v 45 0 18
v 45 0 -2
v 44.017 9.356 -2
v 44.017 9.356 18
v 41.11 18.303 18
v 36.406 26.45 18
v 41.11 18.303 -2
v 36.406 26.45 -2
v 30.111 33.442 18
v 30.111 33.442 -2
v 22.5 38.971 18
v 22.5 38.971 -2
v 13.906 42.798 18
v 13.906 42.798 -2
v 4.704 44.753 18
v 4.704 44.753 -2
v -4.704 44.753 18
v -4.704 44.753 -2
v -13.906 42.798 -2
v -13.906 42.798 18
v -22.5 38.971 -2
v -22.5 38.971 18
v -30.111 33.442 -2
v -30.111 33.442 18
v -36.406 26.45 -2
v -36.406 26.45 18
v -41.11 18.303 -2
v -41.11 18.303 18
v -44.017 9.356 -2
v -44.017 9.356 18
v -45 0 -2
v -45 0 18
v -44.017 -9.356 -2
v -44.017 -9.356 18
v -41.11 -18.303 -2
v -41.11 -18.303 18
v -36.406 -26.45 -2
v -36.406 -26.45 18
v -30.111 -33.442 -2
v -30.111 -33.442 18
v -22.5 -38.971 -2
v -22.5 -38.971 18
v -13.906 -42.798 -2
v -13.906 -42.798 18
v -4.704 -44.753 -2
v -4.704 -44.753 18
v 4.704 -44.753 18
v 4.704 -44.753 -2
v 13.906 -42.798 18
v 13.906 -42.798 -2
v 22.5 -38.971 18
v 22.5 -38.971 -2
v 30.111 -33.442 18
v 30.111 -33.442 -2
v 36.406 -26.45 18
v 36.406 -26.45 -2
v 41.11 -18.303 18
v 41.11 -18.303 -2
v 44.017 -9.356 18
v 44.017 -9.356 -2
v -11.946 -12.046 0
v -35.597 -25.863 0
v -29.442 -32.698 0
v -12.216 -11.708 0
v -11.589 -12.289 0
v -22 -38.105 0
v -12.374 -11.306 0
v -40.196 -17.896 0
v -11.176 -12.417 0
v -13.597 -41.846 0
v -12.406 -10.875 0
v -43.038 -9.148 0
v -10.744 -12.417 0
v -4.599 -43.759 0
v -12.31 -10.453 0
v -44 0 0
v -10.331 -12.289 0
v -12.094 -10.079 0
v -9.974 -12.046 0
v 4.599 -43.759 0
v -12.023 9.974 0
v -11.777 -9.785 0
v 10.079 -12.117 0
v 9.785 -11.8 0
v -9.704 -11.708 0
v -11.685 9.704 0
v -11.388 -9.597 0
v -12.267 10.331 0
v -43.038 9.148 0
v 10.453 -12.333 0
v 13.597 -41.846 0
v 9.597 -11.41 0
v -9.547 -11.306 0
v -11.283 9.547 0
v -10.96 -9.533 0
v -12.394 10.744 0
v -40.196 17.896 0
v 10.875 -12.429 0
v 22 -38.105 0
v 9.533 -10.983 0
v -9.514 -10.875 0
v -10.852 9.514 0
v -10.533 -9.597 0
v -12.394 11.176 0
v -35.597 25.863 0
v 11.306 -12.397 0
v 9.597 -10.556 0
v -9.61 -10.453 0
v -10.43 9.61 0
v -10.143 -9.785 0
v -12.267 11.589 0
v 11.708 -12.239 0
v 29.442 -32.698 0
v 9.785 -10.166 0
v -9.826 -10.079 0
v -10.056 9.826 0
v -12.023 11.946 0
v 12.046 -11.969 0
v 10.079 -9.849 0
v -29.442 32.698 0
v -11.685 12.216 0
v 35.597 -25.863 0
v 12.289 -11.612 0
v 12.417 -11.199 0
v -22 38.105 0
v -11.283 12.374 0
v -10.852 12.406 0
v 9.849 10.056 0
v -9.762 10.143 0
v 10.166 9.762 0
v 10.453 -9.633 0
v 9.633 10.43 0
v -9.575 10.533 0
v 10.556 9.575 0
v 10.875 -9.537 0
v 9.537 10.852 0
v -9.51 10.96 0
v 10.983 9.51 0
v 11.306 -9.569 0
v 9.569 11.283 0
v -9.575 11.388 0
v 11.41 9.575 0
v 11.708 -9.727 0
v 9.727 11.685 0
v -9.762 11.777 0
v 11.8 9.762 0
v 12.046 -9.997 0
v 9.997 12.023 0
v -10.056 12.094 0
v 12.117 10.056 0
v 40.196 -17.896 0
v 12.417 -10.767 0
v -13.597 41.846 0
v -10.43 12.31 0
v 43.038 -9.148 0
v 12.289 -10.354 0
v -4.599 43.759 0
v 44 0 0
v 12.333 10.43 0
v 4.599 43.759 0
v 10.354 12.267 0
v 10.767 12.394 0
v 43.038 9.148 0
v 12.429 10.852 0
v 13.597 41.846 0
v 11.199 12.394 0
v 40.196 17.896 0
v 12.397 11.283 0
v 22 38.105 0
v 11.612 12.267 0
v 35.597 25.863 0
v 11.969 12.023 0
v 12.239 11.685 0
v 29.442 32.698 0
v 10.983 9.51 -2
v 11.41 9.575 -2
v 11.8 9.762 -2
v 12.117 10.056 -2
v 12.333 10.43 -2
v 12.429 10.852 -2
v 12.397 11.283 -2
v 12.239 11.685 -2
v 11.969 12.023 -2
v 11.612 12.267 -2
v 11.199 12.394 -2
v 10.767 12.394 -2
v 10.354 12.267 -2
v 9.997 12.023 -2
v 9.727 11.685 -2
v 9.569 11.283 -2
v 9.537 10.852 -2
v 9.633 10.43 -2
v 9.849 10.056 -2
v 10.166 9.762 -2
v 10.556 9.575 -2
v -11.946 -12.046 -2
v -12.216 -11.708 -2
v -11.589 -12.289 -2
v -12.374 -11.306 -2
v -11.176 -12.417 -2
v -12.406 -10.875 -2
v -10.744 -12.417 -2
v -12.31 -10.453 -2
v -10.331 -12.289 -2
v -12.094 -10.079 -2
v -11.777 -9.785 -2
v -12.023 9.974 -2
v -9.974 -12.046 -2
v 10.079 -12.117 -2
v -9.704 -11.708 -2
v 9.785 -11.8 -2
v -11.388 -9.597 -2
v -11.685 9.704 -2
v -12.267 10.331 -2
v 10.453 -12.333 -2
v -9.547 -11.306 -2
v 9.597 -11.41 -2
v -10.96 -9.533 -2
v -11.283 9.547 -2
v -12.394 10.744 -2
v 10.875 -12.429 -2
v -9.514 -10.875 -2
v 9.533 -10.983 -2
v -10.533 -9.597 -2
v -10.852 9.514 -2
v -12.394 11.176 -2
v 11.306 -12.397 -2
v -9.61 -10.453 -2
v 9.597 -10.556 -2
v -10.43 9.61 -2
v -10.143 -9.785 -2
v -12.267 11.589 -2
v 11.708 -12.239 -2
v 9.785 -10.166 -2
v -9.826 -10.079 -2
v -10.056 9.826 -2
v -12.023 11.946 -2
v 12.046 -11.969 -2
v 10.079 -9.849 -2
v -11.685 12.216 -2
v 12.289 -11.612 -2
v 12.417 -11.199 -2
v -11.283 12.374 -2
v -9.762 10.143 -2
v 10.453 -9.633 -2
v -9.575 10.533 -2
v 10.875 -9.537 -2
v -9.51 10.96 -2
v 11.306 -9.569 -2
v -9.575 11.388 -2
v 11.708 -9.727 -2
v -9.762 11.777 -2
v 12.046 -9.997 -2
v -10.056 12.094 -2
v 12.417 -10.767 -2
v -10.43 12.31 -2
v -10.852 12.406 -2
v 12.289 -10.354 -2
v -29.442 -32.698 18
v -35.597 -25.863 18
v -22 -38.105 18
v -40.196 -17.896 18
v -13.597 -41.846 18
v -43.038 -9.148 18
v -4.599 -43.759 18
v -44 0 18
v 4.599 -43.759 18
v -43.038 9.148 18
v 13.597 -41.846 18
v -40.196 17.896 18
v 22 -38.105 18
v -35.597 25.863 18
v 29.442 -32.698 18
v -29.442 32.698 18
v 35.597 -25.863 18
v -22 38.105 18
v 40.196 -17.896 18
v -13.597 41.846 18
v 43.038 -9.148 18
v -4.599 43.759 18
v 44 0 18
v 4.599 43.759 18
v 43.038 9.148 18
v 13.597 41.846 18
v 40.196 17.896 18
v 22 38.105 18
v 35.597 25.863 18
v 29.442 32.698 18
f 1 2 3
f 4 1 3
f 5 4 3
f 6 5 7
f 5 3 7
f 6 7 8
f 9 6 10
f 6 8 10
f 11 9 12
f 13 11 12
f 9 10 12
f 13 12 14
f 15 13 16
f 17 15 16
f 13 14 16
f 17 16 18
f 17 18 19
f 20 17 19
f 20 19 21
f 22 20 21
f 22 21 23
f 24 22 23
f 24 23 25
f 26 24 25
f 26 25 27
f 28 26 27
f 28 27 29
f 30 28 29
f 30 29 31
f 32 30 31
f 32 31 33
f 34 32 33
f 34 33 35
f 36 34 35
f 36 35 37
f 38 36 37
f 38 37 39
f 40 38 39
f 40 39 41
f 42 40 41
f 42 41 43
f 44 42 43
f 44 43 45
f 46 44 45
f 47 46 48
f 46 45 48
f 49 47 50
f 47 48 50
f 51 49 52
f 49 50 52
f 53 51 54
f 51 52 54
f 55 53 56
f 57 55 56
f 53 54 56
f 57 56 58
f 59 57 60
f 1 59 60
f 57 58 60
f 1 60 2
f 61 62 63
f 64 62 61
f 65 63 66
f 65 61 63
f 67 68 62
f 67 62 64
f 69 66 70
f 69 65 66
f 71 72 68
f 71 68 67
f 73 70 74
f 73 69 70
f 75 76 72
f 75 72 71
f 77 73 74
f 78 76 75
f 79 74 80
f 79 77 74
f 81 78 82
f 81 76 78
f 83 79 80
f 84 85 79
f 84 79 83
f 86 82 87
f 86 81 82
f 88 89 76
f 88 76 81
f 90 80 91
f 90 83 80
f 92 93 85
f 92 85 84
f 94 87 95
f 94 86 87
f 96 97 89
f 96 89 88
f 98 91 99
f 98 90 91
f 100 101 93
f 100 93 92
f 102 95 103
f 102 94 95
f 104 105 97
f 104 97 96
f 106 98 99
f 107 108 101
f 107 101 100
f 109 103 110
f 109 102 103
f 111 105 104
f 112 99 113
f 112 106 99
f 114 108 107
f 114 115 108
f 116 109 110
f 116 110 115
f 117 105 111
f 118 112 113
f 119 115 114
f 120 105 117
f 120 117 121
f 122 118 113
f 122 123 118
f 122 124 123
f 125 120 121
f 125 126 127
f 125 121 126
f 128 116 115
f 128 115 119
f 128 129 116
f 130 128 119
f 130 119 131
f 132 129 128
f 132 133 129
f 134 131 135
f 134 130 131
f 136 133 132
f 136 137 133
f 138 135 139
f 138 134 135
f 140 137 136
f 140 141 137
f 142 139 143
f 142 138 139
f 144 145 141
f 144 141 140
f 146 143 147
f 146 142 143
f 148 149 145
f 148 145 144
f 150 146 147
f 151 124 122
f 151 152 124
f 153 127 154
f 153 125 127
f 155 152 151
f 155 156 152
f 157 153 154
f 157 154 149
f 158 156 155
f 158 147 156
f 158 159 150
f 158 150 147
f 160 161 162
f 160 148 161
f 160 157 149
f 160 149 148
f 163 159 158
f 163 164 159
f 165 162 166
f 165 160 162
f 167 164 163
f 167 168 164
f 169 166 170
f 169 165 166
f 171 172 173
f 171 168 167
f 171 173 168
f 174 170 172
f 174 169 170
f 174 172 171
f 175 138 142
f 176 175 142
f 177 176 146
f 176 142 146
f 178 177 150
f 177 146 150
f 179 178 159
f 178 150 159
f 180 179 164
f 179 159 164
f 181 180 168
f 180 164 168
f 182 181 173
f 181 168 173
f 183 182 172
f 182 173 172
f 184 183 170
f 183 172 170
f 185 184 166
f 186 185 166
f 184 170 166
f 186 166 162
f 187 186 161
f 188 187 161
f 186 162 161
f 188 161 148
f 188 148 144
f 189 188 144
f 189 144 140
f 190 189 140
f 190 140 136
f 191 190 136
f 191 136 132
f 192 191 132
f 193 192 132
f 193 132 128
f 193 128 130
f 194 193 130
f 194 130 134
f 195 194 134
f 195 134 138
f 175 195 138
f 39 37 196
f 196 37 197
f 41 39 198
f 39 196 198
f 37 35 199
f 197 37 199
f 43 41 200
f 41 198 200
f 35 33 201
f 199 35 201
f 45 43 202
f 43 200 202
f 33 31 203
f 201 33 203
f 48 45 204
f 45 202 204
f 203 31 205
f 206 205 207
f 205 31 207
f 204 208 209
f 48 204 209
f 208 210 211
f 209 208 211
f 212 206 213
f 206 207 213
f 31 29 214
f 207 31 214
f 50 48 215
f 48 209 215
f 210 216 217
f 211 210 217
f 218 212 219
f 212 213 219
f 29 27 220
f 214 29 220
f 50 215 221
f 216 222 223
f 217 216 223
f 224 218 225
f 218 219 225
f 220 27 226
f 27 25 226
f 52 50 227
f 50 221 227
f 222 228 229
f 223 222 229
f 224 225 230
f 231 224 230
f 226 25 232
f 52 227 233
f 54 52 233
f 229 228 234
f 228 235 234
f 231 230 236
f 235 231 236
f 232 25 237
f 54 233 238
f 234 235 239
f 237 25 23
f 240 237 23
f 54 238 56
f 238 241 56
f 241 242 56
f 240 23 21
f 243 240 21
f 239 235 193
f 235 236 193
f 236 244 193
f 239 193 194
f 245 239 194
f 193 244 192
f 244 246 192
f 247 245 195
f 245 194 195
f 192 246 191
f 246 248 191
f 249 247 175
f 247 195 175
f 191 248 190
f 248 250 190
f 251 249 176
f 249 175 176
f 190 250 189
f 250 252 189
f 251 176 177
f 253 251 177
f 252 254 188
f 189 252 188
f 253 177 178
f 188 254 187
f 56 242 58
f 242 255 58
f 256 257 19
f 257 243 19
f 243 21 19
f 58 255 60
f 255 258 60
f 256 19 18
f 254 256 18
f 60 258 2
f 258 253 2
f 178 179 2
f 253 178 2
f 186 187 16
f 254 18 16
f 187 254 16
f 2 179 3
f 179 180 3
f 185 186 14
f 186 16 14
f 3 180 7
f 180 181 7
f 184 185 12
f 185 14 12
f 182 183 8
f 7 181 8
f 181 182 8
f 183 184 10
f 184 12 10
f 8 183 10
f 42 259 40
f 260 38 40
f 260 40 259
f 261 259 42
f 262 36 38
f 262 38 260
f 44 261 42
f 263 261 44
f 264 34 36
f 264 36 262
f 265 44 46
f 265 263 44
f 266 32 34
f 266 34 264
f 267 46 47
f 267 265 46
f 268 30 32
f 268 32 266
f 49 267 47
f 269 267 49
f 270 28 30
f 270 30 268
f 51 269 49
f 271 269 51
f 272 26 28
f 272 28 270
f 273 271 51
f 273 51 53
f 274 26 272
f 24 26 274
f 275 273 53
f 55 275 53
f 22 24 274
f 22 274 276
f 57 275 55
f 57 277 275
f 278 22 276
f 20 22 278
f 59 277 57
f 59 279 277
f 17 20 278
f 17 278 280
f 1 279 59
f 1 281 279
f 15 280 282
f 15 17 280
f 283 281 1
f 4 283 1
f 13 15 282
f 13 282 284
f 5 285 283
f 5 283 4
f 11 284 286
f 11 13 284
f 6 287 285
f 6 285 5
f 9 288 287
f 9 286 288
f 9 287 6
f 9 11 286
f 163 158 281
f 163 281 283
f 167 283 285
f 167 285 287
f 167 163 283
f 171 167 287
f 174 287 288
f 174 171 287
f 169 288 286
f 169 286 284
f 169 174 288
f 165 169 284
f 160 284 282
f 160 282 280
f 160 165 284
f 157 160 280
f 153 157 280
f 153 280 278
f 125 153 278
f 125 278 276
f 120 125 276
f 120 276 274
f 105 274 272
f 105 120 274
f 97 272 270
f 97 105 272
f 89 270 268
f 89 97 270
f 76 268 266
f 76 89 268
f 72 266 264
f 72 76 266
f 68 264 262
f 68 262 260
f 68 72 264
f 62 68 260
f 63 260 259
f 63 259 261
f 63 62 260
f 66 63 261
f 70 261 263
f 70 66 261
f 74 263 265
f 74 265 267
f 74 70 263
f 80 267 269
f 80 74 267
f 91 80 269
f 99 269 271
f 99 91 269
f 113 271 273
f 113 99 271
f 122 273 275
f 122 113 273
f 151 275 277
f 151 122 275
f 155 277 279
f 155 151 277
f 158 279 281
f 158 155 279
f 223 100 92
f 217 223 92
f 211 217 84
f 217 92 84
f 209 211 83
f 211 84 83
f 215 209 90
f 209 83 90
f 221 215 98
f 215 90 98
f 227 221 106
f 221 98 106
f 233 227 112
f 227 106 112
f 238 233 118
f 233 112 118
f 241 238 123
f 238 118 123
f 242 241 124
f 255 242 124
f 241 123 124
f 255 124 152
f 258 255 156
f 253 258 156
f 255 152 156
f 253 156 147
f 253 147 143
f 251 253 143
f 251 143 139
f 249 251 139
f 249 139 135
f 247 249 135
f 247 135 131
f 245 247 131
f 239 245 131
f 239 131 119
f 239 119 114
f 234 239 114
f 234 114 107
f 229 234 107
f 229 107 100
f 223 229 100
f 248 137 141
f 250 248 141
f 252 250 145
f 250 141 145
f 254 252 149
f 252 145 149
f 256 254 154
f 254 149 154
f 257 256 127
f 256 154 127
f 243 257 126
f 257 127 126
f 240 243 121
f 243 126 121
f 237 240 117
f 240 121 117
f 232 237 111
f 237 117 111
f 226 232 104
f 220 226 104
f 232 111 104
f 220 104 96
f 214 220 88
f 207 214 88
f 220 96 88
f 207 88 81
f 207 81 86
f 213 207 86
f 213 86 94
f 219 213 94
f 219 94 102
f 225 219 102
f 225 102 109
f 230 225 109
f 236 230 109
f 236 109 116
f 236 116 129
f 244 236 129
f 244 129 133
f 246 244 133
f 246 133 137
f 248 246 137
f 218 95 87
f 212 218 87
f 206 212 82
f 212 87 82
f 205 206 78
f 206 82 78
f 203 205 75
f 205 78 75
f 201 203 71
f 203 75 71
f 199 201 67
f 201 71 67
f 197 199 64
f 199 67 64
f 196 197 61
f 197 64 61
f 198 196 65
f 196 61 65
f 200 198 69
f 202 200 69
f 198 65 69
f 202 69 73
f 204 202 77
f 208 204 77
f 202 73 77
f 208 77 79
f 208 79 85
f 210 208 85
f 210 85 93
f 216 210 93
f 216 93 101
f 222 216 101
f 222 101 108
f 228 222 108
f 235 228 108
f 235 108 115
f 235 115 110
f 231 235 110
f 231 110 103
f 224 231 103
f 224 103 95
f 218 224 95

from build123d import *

# Parameters (mm, degrees)
SKETCH1_R               = 45
SKETCH1_R_2             = 44
BOSS_EXTRUDE1_DEPTH     = 18
BOSS_EXTRUDE2_START     = -2
SKETCH1_2_R             = 45
SKETCH1_2_R_2           = 44
BOSS_EXTRUDE2_DEPTH     = 2
M3_5X0_6_TAPPED_HOLE1_D = 2.9
CIRPATTERN1_COUNT       = 4


with BuildPart() as part:
    # Sketch1 → Boss-Extrude1 (new body)
    with BuildSketch(Plane.XY):
        Circle(SKETCH1_R)
        Circle(SKETCH1_R_2, mode=Mode.SUBTRACT)
    extrude(amount=BOSS_EXTRUDE1_DEPTH)

    # Sketch1<2> → Boss-Extrude2 (add)
    # profile 1 of 2: a face of its own
    with BuildSketch(Plane.XY.offset(BOSS_EXTRUDE2_START)):
        Circle(SKETCH1_2_R)
        Circle(SKETCH1_2_R_2, mode=Mode.SUBTRACT)
    # profile 2 of 2: a face of its own
    with BuildSketch(Plane.XY.offset(BOSS_EXTRUDE2_START)):
        Circle(SKETCH1_2_R_2)
    extrude(amount=BOSS_EXTRUDE2_DEPTH)

    # M3.5x0.6 Tapped Hole1 (through all)
    with Locations(Plane(origin=(0, 0, -2), x_dir=(-1, 0, 0), z_dir=(0, 0, -1))):
        with Locations((10.960155108, 10.960155108)):
            m3_5x0_6_tapped_hole1 = Hole(M3_5X0_6_TAPPED_HOLE1_D / 2)

    # CirPattern1: M3.5x0.6 Tapped Hole1 ×4 about axis
    cirpattern1_axis = Axis((0.011391445, -0.011391445, 0), (0, 0, 1))
    for i in range(1, CIRPATTERN1_COUNT):
        add(m3_5x0_6_tapped_hole1.rotate(cirpattern1_axis, i * 360 / CIRPATTERN1_COUNT), mode=Mode.SUBTRACT)


solid = part.part
